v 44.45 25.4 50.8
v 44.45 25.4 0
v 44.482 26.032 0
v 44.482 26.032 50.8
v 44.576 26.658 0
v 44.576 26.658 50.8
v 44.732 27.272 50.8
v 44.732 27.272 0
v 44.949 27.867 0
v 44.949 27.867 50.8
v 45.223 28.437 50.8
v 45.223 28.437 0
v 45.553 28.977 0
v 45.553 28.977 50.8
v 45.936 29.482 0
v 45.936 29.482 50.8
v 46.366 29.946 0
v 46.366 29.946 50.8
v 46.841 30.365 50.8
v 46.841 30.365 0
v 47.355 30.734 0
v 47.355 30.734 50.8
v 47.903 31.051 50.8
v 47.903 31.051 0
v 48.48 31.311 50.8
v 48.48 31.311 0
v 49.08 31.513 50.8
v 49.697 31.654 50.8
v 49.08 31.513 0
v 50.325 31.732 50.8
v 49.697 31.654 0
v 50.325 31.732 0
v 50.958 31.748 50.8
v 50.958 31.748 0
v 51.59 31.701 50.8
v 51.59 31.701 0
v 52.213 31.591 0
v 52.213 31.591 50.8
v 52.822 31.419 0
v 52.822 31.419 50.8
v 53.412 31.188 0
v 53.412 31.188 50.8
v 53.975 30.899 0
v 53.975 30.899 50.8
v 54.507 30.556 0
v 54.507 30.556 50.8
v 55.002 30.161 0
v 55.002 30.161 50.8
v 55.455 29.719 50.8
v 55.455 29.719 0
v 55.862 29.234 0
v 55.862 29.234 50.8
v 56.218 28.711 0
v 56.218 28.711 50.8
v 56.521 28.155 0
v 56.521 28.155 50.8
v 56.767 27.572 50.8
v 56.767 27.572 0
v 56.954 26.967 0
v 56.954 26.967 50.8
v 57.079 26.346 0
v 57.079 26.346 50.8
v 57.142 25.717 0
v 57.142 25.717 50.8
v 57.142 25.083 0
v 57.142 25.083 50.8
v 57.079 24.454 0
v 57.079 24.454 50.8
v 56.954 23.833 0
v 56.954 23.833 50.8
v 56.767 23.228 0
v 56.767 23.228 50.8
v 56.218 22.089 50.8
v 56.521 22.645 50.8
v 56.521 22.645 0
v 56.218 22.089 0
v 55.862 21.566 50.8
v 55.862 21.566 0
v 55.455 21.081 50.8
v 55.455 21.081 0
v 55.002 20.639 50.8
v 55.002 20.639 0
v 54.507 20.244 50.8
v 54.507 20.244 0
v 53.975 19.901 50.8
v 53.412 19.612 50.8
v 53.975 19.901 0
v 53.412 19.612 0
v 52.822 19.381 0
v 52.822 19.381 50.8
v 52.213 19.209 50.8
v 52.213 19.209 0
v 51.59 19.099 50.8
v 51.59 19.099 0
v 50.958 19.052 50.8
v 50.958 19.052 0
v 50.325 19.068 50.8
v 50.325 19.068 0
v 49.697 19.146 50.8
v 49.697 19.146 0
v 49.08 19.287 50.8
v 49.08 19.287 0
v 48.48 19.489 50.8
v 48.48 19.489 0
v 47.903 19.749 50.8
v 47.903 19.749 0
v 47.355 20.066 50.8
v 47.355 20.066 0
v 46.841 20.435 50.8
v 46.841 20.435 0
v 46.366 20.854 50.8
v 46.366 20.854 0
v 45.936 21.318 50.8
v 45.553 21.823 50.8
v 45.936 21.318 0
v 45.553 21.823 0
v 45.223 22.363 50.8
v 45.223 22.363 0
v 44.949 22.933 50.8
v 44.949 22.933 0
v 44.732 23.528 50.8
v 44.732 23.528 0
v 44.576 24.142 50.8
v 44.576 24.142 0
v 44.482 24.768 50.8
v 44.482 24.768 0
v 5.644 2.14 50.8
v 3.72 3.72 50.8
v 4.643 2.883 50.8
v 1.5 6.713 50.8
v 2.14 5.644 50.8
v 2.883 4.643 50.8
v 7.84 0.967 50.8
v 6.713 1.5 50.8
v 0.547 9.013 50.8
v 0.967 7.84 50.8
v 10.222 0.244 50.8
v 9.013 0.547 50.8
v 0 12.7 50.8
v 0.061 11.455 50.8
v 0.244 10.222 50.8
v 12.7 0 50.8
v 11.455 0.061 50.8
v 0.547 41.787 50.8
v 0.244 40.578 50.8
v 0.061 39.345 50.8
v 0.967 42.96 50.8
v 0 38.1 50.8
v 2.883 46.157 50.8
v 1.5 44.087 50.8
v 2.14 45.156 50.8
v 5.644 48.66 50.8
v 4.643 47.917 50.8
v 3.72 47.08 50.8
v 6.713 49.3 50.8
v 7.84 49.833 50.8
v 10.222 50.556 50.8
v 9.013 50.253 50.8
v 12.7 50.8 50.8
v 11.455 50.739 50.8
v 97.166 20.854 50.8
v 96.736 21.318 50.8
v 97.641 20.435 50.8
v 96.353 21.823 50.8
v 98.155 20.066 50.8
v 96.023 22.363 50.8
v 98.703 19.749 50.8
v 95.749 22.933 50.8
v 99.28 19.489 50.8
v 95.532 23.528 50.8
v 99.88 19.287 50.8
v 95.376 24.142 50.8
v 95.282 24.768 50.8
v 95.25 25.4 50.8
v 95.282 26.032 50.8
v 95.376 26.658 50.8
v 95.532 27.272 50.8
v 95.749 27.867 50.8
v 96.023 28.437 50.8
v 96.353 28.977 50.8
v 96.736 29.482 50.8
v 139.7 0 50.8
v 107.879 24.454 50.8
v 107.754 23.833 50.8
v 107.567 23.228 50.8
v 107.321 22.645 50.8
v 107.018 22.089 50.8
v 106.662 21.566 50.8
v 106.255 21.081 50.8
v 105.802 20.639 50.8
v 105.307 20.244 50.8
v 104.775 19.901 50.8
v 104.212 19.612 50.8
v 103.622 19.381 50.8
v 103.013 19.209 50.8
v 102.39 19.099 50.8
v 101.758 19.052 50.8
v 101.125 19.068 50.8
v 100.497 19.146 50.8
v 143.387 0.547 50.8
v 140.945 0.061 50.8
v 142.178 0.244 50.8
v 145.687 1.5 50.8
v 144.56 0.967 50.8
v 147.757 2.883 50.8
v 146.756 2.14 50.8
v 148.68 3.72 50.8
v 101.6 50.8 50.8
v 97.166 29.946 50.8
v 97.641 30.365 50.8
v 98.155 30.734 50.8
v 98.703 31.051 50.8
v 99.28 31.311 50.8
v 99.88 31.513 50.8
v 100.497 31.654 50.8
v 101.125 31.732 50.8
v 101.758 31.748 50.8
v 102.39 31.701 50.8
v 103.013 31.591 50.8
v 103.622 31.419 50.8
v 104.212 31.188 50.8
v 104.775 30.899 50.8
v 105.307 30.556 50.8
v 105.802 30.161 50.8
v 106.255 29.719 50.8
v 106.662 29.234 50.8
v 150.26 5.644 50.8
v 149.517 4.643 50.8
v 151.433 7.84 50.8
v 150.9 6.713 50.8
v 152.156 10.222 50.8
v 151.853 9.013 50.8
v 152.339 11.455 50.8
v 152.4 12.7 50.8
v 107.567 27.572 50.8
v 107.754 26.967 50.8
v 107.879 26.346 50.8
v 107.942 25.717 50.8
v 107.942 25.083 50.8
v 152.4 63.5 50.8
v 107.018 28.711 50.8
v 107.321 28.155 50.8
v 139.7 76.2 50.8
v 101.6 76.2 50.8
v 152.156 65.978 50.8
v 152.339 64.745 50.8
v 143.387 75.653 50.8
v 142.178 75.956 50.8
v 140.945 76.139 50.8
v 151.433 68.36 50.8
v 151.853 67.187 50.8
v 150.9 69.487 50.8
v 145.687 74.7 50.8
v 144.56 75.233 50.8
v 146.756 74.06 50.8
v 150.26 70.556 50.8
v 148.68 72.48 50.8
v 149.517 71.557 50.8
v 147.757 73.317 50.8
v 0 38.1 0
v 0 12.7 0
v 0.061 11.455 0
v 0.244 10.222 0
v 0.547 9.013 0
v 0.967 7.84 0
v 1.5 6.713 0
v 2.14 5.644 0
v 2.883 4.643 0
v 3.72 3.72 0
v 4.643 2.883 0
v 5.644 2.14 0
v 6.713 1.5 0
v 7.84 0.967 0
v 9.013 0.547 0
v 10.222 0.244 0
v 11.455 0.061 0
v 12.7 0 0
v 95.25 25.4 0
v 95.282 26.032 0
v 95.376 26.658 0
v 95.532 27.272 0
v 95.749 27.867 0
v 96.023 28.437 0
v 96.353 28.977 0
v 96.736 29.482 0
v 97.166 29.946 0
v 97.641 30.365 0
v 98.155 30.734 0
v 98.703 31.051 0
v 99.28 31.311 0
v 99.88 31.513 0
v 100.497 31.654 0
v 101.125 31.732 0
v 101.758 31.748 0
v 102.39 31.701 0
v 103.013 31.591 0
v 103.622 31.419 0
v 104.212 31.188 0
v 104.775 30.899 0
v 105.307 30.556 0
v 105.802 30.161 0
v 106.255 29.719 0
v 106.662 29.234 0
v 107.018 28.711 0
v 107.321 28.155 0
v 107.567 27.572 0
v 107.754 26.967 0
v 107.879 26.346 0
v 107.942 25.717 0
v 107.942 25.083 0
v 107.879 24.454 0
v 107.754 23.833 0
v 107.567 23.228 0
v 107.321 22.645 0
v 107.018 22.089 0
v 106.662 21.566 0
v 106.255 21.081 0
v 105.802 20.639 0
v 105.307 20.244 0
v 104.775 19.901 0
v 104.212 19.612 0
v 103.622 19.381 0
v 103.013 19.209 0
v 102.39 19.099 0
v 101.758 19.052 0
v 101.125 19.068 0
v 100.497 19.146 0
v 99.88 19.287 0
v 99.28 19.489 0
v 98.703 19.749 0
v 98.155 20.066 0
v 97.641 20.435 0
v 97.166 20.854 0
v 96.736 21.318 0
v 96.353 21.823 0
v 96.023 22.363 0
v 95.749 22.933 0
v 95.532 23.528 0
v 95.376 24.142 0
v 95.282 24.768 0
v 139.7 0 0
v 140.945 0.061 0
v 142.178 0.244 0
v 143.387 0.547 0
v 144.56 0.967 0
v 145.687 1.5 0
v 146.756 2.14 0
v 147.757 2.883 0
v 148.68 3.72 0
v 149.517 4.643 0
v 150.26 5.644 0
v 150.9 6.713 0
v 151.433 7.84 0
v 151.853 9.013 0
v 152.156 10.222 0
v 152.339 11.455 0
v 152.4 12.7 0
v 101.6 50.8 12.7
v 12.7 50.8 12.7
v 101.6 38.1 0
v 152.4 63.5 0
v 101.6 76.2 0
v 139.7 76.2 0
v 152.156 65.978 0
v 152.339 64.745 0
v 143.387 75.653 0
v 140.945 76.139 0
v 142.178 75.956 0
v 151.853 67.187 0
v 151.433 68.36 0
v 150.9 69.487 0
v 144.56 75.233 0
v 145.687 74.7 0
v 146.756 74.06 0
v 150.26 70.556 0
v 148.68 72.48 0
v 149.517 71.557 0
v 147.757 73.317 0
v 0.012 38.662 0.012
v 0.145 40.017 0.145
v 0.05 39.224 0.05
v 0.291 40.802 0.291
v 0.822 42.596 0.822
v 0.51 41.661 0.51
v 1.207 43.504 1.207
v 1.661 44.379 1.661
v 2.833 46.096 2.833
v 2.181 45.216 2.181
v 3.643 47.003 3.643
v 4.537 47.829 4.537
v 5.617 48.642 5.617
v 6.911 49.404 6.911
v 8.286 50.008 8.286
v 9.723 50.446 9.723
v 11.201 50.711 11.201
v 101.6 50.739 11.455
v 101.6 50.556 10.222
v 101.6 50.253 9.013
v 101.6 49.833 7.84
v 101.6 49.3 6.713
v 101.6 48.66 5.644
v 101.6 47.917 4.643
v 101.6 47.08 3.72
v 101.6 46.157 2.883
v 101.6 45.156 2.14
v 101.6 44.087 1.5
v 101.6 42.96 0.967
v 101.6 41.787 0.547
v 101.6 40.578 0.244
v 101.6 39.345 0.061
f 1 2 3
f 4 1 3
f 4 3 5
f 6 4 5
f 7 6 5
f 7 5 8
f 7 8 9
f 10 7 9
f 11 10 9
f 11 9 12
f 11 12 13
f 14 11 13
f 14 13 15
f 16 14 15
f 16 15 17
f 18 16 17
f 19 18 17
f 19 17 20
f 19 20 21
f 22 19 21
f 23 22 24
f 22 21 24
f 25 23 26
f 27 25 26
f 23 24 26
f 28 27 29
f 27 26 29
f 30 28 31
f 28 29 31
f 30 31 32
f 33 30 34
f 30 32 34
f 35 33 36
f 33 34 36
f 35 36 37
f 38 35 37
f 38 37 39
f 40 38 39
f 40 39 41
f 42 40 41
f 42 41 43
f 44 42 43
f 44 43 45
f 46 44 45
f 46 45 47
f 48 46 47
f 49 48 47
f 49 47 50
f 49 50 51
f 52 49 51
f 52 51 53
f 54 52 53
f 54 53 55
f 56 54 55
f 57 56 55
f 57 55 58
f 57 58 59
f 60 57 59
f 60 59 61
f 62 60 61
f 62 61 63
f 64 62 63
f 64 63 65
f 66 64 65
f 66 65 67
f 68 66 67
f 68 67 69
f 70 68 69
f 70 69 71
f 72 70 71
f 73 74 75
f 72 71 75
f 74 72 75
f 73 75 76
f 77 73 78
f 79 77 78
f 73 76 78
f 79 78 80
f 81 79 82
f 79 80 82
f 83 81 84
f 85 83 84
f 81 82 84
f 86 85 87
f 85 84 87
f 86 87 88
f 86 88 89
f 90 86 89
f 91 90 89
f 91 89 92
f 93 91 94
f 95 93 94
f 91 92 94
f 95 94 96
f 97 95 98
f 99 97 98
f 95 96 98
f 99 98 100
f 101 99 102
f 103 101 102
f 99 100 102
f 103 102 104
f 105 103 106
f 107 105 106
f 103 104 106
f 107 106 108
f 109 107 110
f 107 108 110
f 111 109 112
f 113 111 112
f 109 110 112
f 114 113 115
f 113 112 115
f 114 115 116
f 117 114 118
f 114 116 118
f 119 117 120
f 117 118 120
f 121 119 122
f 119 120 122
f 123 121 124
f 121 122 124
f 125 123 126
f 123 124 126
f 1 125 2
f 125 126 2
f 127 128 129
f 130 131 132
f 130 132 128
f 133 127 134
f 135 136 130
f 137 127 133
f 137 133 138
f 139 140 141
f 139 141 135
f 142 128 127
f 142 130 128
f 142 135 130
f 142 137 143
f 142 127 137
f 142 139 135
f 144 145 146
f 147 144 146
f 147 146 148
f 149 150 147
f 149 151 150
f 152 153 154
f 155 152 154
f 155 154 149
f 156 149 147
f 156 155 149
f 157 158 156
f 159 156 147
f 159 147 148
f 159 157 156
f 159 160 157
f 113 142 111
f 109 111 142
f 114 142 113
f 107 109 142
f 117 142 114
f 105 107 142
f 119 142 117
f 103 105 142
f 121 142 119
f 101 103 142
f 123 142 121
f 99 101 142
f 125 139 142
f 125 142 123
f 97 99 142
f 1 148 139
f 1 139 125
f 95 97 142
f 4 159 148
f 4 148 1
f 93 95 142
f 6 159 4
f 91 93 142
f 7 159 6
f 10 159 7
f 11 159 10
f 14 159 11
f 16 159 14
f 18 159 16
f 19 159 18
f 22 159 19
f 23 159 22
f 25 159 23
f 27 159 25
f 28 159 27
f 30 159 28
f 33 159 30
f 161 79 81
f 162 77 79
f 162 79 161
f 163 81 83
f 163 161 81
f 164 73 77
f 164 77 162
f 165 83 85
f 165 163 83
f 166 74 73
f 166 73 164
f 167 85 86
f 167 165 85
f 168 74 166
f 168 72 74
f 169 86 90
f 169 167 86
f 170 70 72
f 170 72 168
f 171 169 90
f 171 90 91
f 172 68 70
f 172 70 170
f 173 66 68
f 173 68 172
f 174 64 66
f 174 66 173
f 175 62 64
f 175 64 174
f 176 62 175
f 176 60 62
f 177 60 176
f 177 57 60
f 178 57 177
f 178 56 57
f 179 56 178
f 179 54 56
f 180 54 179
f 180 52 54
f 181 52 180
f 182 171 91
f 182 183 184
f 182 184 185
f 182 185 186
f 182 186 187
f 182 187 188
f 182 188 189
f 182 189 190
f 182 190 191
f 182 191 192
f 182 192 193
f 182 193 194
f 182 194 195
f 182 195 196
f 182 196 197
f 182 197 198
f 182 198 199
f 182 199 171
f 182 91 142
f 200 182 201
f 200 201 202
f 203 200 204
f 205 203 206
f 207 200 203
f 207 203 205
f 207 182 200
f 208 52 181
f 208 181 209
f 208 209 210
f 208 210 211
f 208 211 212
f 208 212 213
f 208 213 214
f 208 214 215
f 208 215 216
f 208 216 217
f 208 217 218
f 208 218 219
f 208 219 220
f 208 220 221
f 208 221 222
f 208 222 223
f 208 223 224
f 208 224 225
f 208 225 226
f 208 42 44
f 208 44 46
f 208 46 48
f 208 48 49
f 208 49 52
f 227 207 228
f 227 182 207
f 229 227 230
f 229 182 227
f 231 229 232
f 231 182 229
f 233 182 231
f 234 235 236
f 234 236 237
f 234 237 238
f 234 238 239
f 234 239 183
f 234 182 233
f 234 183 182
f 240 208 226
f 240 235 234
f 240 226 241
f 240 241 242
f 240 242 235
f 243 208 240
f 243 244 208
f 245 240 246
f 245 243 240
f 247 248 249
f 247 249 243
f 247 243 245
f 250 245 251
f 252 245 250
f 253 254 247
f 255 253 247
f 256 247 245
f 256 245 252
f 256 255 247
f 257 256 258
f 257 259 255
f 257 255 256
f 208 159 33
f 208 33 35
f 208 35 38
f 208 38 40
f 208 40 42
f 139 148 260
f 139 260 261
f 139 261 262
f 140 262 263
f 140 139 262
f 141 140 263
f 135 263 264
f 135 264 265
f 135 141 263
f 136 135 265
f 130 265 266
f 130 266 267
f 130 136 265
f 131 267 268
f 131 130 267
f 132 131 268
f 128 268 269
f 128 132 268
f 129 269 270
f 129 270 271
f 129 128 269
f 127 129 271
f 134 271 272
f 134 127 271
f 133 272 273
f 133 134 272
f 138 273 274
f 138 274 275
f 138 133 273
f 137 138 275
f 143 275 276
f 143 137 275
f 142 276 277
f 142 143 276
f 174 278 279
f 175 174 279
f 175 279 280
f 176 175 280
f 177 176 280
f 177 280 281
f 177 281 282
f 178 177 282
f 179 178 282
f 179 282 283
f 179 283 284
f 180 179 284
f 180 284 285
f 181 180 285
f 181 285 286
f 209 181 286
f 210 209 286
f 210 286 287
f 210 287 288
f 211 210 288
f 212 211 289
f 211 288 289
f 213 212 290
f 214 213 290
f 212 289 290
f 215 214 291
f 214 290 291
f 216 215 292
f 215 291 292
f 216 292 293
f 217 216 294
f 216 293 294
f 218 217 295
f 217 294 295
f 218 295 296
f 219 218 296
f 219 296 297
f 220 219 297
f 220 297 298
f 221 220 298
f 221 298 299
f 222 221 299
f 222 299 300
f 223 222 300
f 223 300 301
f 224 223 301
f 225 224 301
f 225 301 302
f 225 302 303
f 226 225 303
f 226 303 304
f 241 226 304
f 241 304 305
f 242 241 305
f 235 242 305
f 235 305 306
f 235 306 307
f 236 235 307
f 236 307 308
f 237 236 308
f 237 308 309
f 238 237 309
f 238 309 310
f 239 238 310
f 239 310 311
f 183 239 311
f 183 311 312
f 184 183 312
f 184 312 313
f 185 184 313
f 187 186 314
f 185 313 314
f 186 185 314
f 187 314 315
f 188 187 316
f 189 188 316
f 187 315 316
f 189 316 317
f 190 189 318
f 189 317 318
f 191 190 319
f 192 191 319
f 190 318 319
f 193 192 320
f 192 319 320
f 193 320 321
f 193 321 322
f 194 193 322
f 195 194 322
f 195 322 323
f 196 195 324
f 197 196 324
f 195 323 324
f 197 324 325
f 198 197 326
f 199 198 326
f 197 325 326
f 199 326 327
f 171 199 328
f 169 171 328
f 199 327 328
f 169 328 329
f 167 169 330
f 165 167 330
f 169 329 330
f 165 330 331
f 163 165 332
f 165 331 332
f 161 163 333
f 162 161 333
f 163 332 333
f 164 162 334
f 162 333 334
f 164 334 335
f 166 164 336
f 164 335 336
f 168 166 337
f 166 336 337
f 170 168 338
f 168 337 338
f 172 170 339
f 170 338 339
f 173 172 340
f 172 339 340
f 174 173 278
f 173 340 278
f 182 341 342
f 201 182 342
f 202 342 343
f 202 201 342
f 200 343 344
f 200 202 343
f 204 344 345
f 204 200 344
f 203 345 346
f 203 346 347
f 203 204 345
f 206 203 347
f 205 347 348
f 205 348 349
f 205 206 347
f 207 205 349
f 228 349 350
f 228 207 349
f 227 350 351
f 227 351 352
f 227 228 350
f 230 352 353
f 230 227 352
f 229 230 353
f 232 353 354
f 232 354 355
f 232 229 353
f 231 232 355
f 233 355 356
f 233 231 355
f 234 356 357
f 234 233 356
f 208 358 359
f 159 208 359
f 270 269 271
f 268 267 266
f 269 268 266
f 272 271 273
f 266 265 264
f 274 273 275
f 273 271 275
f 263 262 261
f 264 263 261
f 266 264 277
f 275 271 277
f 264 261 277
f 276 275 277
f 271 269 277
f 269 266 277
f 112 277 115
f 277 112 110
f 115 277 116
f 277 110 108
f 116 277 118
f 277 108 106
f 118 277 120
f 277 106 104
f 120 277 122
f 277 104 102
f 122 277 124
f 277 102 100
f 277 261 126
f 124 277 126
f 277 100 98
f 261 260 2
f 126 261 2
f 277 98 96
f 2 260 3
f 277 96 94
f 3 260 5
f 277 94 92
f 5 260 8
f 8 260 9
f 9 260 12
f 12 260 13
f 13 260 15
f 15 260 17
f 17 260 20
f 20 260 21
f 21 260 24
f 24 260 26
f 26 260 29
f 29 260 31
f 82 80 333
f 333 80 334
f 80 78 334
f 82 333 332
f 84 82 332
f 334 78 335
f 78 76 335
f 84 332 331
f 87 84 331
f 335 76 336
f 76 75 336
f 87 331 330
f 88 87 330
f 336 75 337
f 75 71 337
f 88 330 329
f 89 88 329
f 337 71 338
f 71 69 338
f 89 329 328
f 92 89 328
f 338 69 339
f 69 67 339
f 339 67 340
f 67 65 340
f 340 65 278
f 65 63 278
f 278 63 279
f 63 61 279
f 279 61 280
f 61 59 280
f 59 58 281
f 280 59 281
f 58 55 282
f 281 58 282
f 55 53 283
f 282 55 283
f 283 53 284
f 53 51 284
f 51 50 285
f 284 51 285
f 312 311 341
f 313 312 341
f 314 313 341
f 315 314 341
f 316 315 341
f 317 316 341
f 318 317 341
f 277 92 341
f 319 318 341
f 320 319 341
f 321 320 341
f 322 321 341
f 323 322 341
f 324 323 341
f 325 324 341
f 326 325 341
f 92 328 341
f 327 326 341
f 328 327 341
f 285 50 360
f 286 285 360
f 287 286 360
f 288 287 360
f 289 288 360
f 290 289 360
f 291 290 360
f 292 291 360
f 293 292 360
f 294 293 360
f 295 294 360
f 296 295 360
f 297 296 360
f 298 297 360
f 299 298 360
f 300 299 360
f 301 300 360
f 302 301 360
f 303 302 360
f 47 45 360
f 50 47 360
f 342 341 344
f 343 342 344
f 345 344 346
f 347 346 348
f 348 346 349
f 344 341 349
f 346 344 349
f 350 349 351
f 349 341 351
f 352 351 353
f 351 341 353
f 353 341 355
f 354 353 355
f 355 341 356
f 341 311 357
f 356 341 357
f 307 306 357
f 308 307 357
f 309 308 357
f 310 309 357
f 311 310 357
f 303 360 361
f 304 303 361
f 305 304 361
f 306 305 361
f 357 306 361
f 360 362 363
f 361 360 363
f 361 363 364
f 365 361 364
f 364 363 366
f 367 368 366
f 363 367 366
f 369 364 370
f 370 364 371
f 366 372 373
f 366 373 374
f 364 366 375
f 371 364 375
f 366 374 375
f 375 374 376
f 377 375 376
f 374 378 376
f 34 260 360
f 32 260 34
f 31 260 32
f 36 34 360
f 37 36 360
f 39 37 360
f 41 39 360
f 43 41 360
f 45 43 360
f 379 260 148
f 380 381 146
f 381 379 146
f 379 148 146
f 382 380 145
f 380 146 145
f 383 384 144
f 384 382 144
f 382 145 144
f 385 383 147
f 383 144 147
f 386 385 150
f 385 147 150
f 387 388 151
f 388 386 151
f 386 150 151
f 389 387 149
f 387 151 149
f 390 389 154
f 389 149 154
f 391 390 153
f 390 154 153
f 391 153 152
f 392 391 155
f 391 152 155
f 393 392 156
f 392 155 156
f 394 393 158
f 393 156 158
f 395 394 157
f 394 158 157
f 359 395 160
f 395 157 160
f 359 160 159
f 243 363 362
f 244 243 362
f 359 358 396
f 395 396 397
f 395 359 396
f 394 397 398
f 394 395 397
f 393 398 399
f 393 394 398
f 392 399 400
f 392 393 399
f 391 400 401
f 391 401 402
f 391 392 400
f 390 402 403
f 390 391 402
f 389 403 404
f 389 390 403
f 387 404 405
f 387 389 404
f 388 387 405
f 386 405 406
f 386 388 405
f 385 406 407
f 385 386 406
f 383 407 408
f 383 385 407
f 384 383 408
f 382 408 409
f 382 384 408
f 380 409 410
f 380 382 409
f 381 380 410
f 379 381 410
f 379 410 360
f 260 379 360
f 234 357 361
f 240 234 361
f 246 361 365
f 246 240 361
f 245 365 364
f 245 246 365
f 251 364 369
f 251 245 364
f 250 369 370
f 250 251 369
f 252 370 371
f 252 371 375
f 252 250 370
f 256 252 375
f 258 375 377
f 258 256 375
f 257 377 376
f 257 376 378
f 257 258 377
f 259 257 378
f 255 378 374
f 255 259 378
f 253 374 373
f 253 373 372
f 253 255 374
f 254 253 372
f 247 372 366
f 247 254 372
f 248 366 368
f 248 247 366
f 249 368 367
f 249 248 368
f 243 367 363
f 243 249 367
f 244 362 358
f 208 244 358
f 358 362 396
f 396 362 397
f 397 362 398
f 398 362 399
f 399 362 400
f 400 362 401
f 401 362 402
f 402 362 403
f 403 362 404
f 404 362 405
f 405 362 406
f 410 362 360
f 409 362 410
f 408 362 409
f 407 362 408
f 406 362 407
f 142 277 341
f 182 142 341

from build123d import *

# Parameters (mm, degrees)
F1_DEPTH = 50.8
F2_R     = 12.7
F4_D     = 12.7


with BuildPart() as f1:
    # F0 (on Top) → F1 (new body)
    with BuildSketch(Plane.XY):
        Polygon((0, 50.8), (0, 0), (152.4, 0), (152.4, 76.2), (101.6, 76.2), (101.6, 50.8), align=None)
    extrude(amount=F1_DEPTH)

    # F2
    f2_edges = [f1.edges().sort_by_distance(p)[0] for p in [
        (152.4, 76.2, 25.4),
        (152.4, 0, 25.4),
        (50.8, 50.8, 0),
        (0, 50.8, 25.4),
        (0, 0, 25.4),
    ]]
    fillet(f2_edges, radius=F2_R)

    # F4 (through all)
    with Locations(Plane.XY.offset(50.8)):
        with Locations((50.8, 25.4), (101.6, 25.4)):
            Hole(F4_D / 2)


solid = f1.part
